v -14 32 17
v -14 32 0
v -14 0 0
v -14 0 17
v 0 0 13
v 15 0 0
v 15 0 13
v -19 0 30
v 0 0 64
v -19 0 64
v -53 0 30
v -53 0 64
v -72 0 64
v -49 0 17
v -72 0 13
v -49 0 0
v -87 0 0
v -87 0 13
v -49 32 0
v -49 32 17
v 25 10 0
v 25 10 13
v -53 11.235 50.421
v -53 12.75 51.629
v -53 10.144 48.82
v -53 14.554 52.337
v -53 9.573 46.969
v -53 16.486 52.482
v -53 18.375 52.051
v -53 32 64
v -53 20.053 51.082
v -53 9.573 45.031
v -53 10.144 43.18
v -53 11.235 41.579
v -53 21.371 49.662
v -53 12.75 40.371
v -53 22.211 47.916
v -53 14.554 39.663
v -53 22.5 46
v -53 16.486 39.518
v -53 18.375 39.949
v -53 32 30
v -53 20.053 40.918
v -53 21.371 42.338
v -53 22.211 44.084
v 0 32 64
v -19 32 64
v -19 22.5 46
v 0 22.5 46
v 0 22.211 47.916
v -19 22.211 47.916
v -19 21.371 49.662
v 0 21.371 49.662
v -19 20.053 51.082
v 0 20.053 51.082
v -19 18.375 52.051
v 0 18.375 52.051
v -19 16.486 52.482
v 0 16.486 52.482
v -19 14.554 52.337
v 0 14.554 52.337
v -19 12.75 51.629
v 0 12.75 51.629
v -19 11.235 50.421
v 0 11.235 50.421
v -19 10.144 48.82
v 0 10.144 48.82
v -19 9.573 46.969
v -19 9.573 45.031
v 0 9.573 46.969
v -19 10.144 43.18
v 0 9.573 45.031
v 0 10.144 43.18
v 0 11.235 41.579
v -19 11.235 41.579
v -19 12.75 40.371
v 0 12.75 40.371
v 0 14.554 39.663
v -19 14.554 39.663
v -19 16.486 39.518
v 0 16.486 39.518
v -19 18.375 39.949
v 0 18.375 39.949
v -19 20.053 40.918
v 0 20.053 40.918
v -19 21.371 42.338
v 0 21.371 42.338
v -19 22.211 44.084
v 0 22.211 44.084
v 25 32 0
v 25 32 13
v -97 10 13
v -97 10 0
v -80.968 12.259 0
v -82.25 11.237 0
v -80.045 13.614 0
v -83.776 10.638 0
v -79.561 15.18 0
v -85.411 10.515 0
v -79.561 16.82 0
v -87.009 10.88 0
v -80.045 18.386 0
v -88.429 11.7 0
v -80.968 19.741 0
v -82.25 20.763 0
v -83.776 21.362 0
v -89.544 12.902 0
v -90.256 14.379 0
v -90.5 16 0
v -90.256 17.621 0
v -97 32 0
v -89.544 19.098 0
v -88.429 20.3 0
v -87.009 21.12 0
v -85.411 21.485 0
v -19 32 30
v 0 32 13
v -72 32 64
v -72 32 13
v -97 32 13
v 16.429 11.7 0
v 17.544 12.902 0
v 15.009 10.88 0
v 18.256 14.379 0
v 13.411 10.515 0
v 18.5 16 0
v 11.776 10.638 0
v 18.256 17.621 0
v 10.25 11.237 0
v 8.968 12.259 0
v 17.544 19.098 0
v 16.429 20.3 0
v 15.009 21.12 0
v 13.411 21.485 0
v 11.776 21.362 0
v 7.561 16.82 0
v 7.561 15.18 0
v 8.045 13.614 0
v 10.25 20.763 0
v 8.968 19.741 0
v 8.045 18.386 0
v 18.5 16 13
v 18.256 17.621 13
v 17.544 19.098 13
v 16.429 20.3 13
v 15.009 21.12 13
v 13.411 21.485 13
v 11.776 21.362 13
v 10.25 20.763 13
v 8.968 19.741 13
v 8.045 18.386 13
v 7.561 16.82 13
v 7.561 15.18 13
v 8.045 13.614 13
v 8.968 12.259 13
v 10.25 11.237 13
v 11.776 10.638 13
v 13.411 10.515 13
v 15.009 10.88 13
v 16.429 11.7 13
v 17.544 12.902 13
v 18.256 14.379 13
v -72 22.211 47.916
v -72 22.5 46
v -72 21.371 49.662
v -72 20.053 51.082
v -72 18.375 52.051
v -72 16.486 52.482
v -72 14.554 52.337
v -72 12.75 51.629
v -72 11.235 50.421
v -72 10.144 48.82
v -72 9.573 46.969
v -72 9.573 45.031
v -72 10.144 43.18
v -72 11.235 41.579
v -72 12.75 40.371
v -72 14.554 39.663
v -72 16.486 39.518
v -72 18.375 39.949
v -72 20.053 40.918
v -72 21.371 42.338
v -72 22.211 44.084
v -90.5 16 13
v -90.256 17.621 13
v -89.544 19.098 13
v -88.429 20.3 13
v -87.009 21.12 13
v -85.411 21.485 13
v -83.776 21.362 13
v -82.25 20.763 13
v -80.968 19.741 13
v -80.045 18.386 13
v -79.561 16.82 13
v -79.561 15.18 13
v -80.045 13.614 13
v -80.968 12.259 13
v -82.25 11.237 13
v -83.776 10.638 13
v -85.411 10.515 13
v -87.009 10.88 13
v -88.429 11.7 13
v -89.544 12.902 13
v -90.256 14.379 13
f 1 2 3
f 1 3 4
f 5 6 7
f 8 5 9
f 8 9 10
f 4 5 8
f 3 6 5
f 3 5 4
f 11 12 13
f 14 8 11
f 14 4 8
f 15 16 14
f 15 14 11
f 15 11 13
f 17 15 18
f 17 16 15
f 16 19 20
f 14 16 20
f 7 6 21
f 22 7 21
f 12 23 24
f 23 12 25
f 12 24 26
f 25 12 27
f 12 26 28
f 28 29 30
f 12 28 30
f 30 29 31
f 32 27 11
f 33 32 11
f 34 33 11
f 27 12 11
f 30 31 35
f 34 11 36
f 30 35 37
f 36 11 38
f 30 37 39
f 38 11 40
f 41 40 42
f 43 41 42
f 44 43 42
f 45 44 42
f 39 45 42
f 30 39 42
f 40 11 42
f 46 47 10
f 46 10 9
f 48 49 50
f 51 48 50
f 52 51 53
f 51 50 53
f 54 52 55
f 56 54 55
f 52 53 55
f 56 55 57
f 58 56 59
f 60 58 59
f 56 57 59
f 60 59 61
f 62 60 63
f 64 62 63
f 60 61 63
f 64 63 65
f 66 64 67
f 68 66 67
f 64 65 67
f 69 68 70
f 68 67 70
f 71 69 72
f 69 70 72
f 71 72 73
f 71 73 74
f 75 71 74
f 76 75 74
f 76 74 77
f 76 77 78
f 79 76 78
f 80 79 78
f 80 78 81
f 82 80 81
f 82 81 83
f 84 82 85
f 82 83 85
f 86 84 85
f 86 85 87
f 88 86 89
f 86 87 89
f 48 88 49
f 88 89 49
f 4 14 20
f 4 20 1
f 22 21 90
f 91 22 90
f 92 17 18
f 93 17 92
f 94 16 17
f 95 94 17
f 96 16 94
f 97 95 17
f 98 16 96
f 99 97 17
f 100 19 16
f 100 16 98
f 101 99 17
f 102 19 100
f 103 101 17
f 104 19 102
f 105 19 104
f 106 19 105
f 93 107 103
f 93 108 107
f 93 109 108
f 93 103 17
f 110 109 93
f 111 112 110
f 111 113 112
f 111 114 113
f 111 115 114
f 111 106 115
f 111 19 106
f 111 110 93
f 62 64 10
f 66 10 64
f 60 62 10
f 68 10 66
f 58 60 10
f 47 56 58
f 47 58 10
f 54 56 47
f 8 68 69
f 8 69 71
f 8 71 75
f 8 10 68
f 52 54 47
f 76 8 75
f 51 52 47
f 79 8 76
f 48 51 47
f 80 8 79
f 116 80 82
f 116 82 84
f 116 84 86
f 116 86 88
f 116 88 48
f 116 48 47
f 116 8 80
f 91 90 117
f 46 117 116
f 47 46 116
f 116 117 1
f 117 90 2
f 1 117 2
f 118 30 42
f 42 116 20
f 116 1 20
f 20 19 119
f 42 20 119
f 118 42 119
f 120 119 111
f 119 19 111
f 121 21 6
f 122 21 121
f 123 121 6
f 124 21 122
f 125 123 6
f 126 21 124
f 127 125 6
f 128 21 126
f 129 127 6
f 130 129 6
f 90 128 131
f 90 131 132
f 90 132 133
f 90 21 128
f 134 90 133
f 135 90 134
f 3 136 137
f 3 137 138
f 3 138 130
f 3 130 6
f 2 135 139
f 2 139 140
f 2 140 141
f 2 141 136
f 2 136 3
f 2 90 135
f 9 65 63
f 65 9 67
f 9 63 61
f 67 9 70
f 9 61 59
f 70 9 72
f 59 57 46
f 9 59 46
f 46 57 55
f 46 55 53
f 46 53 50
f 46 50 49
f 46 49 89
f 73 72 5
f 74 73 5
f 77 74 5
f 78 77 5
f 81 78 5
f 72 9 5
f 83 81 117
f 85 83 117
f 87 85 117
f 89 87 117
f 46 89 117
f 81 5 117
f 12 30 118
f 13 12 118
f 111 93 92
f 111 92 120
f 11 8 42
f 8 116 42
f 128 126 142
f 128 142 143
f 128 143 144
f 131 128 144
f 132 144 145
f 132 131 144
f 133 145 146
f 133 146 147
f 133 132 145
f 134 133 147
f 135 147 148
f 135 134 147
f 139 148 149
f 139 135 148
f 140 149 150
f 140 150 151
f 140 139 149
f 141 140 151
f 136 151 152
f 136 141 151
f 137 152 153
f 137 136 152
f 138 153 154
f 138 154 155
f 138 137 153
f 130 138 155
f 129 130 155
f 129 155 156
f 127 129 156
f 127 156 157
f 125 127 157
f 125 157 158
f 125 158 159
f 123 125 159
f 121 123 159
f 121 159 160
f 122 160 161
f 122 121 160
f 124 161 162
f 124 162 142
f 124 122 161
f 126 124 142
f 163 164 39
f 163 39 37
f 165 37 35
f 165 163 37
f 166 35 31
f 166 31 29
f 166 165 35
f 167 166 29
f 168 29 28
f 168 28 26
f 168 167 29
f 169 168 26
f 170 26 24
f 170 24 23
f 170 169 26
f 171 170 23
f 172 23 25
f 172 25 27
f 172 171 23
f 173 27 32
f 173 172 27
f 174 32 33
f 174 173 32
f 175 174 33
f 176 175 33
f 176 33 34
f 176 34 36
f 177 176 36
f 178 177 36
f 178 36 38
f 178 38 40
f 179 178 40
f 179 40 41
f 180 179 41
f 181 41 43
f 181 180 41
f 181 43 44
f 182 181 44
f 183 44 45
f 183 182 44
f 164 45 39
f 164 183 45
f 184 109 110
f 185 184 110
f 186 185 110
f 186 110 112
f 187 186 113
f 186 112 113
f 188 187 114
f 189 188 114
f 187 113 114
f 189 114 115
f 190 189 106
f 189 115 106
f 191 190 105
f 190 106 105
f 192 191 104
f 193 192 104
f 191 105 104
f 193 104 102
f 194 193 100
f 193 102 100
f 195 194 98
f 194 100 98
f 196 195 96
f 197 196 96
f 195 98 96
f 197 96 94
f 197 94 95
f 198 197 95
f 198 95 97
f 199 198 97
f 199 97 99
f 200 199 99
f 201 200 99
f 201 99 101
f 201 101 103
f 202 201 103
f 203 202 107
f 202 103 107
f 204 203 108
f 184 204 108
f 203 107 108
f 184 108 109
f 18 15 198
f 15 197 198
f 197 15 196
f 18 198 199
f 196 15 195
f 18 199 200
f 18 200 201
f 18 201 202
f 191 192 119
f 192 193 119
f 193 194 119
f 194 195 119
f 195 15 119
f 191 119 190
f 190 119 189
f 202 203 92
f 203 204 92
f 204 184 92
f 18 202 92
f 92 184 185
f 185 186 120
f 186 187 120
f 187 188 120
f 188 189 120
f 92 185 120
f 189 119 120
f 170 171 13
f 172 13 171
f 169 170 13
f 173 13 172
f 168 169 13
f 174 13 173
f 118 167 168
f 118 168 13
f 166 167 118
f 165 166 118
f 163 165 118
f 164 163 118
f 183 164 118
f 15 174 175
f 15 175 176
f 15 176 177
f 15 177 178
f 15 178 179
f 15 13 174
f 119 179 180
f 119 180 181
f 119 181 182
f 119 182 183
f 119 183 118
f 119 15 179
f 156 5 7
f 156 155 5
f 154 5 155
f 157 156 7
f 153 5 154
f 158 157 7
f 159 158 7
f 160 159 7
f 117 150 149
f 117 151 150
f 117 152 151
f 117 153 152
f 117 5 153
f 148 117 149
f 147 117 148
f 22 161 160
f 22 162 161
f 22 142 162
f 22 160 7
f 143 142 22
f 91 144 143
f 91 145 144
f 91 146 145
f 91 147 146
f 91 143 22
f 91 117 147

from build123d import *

# Parameters (mm, degrees)
F0_R      = 5.5
F1_DEPTH  = 13
F2_W      = 19
F2_H      = 32
F3_DEPTH  = 64
F4_R      = 6.5
F5_DEPTH  = 19
F6_W      = 17
F6_H      = 32
F7_DEPTH  = 30
F10_W     = 35
F10_H     = 17
F11_DEPTH = 32


with BuildPart() as f1:
    # F0 (on Top) → F1 (new body)
    with BuildSketch(Plane.XY):
        Polygon((0, 32), (0, 0), (15, 0), (25, 10), (25, 32), align=None)
        with Locations((13, 16)):
            Circle(F0_R, mode=Mode.SUBTRACT)
    extrude(amount=F1_DEPTH)

    # F2 (on Top) → F3 (join)
    with BuildSketch(Plane.XY):
        with Locations((-9.5, 16)):
            Rectangle(F2_W, F2_H)
    extrude(amount=F3_DEPTH)

    # F4 (on face) → F5 (cut, through all)
    with BuildSketch(Plane.YZ):
        with Locations((16, 46)):
            Circle(F4_R)
    extrude(amount=-F5_DEPTH, mode=Mode.SUBTRACT)

    # F6 (on Top) → F7 (join)
    with BuildSketch(Plane.XY):
        with Locations((-27.5, 16)):
            Rectangle(F6_W, F6_H)
    extrude(amount=F7_DEPTH)

    # F9: F1 across plane


with BuildPart() as f1_1:
    add(f1.part)
    add(f1.part.mirror(Plane(origin=(-36, 16, 15), x_dir=(0, -1, 0), z_dir=(-1, 0, 0))))

    # F10 (on face) → F11 (cut, through all)
    with BuildSketch(Plane.XZ):
        with Locations((-31.5, 8.5)):
            Rectangle(F10_W, F10_H)
    extrude(amount=-F11_DEPTH, mode=Mode.SUBTRACT)


solid = f1_1.part
